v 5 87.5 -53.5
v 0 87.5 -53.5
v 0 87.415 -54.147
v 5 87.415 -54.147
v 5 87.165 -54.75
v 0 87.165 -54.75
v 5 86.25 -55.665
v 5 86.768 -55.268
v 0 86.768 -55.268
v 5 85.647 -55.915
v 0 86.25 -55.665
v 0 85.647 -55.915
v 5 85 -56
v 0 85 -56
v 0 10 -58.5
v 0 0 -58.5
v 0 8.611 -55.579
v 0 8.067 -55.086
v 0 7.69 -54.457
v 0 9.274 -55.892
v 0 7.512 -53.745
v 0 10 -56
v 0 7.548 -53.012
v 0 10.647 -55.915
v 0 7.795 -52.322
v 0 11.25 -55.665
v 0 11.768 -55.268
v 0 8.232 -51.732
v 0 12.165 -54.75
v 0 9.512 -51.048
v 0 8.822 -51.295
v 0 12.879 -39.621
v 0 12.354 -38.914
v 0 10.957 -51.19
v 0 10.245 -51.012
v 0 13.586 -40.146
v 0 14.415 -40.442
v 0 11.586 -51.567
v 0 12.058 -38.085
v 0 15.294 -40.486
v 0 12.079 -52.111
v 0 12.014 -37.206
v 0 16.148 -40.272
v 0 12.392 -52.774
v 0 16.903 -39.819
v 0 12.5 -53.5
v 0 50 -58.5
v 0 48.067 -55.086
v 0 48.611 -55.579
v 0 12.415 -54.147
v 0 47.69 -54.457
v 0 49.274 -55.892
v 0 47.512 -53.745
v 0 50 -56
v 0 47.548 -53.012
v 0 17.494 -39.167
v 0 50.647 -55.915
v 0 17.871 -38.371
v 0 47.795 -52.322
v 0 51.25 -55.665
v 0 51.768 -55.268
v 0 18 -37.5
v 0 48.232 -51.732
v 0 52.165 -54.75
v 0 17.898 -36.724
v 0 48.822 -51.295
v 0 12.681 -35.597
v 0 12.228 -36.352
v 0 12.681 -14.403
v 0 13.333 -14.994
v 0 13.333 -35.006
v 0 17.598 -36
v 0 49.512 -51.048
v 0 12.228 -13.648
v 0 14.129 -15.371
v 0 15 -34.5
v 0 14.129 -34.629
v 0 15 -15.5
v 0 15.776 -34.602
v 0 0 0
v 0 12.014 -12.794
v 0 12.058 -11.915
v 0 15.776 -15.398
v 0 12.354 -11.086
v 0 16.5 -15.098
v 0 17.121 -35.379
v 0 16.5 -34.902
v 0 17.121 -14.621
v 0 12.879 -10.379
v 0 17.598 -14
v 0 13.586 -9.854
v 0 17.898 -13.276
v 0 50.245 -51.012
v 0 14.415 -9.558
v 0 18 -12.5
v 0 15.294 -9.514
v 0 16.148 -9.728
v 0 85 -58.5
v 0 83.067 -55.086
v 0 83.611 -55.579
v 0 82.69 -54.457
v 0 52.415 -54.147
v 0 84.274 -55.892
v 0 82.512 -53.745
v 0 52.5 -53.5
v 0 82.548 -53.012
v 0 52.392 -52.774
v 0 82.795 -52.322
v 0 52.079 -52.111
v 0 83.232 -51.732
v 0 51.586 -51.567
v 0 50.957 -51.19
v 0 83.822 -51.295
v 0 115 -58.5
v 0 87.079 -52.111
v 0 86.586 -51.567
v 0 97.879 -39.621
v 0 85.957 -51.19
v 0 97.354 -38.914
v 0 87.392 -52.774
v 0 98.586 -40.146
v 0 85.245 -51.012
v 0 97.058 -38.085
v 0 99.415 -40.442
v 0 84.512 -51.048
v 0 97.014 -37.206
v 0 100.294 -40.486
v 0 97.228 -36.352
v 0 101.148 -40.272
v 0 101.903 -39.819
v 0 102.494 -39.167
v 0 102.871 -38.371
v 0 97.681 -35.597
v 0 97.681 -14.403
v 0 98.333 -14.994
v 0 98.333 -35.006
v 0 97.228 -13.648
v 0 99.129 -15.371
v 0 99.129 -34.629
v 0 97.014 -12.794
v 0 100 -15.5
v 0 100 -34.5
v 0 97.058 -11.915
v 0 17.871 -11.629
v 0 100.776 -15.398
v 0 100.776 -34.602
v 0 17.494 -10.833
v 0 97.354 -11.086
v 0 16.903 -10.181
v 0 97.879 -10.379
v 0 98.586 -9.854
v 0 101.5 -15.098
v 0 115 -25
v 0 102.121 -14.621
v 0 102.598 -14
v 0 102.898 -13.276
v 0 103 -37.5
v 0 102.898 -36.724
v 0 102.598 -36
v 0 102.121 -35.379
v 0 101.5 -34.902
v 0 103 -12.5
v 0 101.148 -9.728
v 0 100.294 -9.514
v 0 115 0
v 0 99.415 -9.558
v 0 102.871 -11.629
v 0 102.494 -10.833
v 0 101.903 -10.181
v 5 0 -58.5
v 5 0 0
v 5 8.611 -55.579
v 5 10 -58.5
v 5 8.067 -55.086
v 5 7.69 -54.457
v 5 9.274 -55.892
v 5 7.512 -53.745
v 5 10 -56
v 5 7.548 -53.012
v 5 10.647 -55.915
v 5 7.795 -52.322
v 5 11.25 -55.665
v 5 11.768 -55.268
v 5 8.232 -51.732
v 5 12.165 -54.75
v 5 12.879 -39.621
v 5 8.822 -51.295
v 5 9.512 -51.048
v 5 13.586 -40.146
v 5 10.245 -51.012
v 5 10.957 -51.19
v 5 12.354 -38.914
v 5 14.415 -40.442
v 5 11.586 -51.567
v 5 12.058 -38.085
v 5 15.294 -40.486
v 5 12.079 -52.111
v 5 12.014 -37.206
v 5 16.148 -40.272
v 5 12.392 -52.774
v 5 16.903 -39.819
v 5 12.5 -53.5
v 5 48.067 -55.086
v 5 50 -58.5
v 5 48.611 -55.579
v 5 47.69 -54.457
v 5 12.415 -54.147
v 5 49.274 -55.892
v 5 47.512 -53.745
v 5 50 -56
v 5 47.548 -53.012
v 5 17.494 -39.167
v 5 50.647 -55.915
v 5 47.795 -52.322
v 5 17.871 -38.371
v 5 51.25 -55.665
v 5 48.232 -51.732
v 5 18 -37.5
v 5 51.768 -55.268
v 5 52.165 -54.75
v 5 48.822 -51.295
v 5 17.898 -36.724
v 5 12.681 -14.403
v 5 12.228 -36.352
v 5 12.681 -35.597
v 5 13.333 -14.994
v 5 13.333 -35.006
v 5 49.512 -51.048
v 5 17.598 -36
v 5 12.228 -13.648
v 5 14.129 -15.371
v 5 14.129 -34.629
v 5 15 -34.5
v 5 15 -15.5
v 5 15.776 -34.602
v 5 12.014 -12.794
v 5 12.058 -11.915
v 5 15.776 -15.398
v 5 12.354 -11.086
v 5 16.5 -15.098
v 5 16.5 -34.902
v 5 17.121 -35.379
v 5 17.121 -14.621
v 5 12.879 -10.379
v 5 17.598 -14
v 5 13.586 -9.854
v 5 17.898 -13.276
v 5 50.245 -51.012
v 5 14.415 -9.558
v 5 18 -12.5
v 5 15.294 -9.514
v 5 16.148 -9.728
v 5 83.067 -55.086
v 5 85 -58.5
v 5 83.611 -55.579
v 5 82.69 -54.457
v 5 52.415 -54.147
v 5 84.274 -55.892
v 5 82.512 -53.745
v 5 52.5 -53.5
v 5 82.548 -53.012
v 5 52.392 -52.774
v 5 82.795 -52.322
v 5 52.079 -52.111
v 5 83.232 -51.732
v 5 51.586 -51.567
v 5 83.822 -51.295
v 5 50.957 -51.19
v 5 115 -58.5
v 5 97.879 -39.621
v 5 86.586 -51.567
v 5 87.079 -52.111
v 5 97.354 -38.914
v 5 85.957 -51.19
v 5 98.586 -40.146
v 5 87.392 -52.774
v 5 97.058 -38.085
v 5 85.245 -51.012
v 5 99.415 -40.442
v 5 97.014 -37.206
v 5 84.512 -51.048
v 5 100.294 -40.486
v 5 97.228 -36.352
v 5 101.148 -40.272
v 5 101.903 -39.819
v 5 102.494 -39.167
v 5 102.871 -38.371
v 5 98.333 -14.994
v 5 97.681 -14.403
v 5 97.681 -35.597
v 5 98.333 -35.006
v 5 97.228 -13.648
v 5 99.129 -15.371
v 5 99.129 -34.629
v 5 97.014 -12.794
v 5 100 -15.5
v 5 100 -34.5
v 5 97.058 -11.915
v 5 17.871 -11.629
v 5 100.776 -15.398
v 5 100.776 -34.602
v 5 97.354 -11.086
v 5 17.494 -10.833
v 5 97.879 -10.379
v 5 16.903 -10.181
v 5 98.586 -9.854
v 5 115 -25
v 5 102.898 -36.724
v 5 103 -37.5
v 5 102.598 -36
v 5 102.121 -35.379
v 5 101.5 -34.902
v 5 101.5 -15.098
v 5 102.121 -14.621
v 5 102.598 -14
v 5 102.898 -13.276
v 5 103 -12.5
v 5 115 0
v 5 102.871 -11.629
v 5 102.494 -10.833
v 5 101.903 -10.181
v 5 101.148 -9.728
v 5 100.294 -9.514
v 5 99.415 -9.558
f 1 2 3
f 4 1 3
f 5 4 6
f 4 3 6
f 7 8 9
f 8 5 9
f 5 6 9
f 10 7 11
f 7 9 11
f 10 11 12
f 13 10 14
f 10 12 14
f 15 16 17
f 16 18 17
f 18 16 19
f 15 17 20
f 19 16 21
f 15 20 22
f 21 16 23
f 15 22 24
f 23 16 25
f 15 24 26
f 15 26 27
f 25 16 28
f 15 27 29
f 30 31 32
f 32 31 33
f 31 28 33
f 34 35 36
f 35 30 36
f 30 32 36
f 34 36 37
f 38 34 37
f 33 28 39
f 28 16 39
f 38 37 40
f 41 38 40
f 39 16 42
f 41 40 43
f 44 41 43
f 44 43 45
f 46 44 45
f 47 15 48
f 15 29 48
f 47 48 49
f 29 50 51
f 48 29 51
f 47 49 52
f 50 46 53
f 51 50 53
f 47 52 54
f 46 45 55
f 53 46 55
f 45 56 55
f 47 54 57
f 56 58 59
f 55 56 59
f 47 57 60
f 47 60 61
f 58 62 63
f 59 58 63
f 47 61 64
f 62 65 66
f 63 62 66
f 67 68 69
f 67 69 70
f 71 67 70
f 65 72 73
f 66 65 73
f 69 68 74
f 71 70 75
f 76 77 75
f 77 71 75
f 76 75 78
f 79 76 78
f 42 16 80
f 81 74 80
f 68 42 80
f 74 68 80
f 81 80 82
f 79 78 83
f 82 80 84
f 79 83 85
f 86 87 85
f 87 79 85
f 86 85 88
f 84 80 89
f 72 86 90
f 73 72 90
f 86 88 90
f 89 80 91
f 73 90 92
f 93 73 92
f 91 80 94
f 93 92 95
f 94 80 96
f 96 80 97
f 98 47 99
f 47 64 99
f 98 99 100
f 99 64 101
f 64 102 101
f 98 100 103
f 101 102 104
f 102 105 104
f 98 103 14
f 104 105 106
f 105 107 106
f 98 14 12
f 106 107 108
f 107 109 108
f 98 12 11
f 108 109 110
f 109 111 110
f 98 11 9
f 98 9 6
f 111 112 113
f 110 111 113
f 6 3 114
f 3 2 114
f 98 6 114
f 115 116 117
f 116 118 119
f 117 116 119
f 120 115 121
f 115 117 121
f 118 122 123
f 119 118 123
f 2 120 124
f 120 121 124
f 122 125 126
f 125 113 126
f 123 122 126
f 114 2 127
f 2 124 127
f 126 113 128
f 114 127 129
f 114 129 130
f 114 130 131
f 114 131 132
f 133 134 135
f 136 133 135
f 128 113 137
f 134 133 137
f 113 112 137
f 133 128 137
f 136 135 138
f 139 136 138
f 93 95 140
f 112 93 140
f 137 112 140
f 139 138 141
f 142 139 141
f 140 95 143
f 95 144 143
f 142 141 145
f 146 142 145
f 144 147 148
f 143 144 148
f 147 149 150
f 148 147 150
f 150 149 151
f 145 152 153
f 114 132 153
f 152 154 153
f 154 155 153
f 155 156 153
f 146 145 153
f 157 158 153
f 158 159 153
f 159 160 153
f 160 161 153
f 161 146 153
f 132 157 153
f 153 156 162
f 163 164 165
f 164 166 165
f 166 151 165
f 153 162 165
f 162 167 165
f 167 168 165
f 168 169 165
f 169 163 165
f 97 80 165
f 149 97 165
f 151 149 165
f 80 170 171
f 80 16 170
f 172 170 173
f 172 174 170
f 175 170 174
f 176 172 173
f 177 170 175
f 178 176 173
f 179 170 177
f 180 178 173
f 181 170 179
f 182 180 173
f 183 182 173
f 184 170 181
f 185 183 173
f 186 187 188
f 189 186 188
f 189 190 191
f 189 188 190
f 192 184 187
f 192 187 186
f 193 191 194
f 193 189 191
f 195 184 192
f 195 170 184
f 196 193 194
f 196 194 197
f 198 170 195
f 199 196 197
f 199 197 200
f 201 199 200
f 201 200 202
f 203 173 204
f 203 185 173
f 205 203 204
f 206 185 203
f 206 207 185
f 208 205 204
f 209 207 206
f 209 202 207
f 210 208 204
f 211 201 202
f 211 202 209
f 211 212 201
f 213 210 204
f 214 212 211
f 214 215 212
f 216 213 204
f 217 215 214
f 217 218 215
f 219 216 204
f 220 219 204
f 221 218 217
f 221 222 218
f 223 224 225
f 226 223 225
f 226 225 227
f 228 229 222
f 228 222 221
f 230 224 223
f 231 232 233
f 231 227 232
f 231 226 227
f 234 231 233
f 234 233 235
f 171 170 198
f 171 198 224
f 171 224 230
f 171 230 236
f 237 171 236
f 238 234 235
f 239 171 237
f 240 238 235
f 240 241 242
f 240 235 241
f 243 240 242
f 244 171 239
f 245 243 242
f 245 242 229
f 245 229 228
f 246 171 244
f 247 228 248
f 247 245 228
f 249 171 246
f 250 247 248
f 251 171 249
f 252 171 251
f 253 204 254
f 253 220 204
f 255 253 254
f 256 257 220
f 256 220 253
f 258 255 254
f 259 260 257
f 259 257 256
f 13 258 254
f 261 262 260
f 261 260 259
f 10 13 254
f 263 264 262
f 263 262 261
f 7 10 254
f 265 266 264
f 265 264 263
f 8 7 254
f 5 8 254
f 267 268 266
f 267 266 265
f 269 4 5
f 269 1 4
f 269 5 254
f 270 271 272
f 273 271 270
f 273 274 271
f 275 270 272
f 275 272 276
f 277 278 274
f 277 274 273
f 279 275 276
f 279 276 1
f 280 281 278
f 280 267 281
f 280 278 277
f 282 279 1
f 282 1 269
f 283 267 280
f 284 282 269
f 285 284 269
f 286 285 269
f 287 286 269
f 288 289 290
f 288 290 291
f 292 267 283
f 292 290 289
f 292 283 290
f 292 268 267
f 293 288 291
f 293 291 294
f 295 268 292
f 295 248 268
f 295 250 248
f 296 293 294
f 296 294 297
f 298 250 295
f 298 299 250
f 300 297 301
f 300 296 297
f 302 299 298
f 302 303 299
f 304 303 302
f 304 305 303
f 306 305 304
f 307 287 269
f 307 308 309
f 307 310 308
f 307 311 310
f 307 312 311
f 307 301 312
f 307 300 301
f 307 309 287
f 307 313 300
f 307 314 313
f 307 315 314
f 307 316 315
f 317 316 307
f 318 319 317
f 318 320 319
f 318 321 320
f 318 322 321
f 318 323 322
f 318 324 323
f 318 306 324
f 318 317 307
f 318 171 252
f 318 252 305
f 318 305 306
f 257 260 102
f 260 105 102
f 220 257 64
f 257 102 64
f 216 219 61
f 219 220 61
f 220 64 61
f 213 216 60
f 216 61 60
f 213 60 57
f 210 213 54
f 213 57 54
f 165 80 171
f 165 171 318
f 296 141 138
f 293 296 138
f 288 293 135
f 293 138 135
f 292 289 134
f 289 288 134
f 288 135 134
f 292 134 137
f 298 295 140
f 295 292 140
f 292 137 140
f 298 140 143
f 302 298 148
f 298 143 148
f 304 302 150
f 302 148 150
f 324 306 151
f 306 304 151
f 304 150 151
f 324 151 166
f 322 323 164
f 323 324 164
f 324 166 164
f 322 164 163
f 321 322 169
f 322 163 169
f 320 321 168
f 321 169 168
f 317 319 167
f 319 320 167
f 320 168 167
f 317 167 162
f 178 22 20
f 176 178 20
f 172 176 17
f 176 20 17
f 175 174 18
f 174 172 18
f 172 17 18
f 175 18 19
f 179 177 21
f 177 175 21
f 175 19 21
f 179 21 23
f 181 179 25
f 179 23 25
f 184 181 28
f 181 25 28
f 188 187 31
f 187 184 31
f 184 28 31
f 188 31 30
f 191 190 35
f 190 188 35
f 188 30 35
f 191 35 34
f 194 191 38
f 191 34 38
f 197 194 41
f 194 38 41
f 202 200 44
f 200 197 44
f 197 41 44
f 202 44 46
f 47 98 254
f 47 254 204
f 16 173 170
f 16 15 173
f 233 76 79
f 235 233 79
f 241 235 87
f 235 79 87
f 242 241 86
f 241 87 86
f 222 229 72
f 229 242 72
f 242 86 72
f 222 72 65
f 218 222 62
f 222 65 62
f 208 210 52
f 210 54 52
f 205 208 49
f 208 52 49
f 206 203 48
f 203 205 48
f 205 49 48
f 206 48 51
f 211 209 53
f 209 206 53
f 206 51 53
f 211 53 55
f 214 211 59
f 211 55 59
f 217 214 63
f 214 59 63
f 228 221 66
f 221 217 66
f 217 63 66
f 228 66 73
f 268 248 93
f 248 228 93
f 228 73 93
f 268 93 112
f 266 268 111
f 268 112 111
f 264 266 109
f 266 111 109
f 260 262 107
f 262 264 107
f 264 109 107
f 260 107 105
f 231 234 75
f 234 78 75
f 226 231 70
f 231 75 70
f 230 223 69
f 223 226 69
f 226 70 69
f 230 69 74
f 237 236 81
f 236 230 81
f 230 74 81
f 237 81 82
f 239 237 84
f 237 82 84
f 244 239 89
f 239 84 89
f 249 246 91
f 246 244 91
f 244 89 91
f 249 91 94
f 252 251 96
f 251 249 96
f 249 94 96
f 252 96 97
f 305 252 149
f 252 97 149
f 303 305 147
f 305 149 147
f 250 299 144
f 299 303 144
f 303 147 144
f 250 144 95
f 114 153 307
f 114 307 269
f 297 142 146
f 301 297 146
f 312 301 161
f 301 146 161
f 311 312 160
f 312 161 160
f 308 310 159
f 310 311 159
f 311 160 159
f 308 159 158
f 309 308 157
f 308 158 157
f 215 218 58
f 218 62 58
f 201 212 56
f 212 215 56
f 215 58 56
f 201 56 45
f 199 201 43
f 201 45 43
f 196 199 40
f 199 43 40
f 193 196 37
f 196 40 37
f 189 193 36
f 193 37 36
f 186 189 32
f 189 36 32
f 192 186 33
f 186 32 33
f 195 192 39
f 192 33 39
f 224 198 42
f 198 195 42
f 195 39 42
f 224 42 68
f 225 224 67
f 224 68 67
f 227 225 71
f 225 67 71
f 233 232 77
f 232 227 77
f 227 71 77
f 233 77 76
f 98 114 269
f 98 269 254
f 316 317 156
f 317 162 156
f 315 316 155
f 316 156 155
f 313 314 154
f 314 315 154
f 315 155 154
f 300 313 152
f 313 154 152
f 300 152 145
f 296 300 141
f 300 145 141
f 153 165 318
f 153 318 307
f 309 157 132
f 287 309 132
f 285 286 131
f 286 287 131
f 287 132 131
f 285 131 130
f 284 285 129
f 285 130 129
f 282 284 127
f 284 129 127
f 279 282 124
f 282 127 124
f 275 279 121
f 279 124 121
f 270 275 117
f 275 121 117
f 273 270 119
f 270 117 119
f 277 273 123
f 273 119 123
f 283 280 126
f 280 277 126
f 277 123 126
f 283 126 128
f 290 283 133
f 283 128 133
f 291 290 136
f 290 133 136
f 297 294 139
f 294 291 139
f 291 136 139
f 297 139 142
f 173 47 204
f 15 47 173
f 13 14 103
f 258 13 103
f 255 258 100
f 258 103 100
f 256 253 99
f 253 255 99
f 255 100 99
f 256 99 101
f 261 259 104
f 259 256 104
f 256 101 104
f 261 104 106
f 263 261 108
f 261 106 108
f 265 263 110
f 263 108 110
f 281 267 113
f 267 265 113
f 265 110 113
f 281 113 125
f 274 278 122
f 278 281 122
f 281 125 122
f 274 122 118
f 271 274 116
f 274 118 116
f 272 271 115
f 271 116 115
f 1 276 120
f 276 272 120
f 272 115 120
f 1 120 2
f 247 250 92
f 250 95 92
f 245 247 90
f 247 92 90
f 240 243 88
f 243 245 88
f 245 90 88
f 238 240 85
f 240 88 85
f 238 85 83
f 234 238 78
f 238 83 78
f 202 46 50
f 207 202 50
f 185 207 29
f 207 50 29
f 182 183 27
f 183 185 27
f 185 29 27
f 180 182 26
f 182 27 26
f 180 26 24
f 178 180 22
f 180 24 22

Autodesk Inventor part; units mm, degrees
ref_plane "YZ Plane" through (0, 0, 0) normal (1, 0, 0) x (0, 1, 0)
ref_plane "XZ Plane" through (0, 0, 0) normal (0, 1, 0) x (-1, 0, 0)
ref_plane "XY Plane" through (0, 0, 0) normal (0, 0, 1) x (1, 0, 0)
sketch "Skizze1" plane through (0, 0, 0) normal (1, 0, 0) x (0, 1, 0)
  line L0 (0, 0) -> (115, 0)
  line L1 (115, 0) -> (115, -58.5)
  line L2 (115, -58.5) -> (0, -58.5)
  line L3 (0, -58.5) -> (0, 0)
  line L4 (115, 0) -> (115, -25)
  line L5 (115, -25) -> (100, -25)
  line L6 (100, -25) -> (100, -12.5)
  line L7 (100, -12.5) -> (100, -25)
  line L8 (100, -25) -> (100, -37.5)
  line L9 (100, -25) -> (15, -25)
  line L10 (15, -25) -> (15, -12.5)
  line L11 (15, -12.5) -> (15, -25)
  line L12 (15, -25) -> (15, -37.5)
  circle A0 centre (100, -12.5) radius 3
  circle A1 centre (100, -37.5) radius 3
  circle A2 centre (15, -12.5) radius 3
  circle A3 centre (15, -37.5) radius 3
  line L13 (115, -58.5) -> (85, -58.5)
  line L14 (85, -58.5) -> (50, -58.5)
  line L15 (50, -58.5) -> (10, -58.5)
  line L16 (10, -58.5) -> (10, -53.5)
  line L17 (50, -58.5) -> (50, -53.5)
  line L18 (85, -58.5) -> (85, -53.5)
  circle A4 centre (85, -53.5) radius 2.5
  circle A5 centre (50, -53.5) radius 2.5
  circle A6 centre (10, -53.5) radius 2.5
  dimension "d0" = 115
  dimension "d1" = 58.5
  dimension "d2" = 25
  dimension "d3" = 15
  dimension "d4" = 12.5
  dimension "d5" = 85
  dimension "d6" = 6
  dimension "d7" = 6
  dimension "d8" = 6
  dimension "d9" = 6
  dimension "d10" = 30
  dimension "d11" = 35
  dimension "d12" = 40
  dimension "d13" = 5
  dimension "d14" = 5
  dimension "d15" = 5
  dimension "d16" = 5
  dimension "d17" = 5
  dimension "d18" = 5
extrude "Extrusion1" add sketch "Skizze1" along normal blind 5
properties part number "Motorhalterung_Stützleiste" material "Aluminium 6061"
